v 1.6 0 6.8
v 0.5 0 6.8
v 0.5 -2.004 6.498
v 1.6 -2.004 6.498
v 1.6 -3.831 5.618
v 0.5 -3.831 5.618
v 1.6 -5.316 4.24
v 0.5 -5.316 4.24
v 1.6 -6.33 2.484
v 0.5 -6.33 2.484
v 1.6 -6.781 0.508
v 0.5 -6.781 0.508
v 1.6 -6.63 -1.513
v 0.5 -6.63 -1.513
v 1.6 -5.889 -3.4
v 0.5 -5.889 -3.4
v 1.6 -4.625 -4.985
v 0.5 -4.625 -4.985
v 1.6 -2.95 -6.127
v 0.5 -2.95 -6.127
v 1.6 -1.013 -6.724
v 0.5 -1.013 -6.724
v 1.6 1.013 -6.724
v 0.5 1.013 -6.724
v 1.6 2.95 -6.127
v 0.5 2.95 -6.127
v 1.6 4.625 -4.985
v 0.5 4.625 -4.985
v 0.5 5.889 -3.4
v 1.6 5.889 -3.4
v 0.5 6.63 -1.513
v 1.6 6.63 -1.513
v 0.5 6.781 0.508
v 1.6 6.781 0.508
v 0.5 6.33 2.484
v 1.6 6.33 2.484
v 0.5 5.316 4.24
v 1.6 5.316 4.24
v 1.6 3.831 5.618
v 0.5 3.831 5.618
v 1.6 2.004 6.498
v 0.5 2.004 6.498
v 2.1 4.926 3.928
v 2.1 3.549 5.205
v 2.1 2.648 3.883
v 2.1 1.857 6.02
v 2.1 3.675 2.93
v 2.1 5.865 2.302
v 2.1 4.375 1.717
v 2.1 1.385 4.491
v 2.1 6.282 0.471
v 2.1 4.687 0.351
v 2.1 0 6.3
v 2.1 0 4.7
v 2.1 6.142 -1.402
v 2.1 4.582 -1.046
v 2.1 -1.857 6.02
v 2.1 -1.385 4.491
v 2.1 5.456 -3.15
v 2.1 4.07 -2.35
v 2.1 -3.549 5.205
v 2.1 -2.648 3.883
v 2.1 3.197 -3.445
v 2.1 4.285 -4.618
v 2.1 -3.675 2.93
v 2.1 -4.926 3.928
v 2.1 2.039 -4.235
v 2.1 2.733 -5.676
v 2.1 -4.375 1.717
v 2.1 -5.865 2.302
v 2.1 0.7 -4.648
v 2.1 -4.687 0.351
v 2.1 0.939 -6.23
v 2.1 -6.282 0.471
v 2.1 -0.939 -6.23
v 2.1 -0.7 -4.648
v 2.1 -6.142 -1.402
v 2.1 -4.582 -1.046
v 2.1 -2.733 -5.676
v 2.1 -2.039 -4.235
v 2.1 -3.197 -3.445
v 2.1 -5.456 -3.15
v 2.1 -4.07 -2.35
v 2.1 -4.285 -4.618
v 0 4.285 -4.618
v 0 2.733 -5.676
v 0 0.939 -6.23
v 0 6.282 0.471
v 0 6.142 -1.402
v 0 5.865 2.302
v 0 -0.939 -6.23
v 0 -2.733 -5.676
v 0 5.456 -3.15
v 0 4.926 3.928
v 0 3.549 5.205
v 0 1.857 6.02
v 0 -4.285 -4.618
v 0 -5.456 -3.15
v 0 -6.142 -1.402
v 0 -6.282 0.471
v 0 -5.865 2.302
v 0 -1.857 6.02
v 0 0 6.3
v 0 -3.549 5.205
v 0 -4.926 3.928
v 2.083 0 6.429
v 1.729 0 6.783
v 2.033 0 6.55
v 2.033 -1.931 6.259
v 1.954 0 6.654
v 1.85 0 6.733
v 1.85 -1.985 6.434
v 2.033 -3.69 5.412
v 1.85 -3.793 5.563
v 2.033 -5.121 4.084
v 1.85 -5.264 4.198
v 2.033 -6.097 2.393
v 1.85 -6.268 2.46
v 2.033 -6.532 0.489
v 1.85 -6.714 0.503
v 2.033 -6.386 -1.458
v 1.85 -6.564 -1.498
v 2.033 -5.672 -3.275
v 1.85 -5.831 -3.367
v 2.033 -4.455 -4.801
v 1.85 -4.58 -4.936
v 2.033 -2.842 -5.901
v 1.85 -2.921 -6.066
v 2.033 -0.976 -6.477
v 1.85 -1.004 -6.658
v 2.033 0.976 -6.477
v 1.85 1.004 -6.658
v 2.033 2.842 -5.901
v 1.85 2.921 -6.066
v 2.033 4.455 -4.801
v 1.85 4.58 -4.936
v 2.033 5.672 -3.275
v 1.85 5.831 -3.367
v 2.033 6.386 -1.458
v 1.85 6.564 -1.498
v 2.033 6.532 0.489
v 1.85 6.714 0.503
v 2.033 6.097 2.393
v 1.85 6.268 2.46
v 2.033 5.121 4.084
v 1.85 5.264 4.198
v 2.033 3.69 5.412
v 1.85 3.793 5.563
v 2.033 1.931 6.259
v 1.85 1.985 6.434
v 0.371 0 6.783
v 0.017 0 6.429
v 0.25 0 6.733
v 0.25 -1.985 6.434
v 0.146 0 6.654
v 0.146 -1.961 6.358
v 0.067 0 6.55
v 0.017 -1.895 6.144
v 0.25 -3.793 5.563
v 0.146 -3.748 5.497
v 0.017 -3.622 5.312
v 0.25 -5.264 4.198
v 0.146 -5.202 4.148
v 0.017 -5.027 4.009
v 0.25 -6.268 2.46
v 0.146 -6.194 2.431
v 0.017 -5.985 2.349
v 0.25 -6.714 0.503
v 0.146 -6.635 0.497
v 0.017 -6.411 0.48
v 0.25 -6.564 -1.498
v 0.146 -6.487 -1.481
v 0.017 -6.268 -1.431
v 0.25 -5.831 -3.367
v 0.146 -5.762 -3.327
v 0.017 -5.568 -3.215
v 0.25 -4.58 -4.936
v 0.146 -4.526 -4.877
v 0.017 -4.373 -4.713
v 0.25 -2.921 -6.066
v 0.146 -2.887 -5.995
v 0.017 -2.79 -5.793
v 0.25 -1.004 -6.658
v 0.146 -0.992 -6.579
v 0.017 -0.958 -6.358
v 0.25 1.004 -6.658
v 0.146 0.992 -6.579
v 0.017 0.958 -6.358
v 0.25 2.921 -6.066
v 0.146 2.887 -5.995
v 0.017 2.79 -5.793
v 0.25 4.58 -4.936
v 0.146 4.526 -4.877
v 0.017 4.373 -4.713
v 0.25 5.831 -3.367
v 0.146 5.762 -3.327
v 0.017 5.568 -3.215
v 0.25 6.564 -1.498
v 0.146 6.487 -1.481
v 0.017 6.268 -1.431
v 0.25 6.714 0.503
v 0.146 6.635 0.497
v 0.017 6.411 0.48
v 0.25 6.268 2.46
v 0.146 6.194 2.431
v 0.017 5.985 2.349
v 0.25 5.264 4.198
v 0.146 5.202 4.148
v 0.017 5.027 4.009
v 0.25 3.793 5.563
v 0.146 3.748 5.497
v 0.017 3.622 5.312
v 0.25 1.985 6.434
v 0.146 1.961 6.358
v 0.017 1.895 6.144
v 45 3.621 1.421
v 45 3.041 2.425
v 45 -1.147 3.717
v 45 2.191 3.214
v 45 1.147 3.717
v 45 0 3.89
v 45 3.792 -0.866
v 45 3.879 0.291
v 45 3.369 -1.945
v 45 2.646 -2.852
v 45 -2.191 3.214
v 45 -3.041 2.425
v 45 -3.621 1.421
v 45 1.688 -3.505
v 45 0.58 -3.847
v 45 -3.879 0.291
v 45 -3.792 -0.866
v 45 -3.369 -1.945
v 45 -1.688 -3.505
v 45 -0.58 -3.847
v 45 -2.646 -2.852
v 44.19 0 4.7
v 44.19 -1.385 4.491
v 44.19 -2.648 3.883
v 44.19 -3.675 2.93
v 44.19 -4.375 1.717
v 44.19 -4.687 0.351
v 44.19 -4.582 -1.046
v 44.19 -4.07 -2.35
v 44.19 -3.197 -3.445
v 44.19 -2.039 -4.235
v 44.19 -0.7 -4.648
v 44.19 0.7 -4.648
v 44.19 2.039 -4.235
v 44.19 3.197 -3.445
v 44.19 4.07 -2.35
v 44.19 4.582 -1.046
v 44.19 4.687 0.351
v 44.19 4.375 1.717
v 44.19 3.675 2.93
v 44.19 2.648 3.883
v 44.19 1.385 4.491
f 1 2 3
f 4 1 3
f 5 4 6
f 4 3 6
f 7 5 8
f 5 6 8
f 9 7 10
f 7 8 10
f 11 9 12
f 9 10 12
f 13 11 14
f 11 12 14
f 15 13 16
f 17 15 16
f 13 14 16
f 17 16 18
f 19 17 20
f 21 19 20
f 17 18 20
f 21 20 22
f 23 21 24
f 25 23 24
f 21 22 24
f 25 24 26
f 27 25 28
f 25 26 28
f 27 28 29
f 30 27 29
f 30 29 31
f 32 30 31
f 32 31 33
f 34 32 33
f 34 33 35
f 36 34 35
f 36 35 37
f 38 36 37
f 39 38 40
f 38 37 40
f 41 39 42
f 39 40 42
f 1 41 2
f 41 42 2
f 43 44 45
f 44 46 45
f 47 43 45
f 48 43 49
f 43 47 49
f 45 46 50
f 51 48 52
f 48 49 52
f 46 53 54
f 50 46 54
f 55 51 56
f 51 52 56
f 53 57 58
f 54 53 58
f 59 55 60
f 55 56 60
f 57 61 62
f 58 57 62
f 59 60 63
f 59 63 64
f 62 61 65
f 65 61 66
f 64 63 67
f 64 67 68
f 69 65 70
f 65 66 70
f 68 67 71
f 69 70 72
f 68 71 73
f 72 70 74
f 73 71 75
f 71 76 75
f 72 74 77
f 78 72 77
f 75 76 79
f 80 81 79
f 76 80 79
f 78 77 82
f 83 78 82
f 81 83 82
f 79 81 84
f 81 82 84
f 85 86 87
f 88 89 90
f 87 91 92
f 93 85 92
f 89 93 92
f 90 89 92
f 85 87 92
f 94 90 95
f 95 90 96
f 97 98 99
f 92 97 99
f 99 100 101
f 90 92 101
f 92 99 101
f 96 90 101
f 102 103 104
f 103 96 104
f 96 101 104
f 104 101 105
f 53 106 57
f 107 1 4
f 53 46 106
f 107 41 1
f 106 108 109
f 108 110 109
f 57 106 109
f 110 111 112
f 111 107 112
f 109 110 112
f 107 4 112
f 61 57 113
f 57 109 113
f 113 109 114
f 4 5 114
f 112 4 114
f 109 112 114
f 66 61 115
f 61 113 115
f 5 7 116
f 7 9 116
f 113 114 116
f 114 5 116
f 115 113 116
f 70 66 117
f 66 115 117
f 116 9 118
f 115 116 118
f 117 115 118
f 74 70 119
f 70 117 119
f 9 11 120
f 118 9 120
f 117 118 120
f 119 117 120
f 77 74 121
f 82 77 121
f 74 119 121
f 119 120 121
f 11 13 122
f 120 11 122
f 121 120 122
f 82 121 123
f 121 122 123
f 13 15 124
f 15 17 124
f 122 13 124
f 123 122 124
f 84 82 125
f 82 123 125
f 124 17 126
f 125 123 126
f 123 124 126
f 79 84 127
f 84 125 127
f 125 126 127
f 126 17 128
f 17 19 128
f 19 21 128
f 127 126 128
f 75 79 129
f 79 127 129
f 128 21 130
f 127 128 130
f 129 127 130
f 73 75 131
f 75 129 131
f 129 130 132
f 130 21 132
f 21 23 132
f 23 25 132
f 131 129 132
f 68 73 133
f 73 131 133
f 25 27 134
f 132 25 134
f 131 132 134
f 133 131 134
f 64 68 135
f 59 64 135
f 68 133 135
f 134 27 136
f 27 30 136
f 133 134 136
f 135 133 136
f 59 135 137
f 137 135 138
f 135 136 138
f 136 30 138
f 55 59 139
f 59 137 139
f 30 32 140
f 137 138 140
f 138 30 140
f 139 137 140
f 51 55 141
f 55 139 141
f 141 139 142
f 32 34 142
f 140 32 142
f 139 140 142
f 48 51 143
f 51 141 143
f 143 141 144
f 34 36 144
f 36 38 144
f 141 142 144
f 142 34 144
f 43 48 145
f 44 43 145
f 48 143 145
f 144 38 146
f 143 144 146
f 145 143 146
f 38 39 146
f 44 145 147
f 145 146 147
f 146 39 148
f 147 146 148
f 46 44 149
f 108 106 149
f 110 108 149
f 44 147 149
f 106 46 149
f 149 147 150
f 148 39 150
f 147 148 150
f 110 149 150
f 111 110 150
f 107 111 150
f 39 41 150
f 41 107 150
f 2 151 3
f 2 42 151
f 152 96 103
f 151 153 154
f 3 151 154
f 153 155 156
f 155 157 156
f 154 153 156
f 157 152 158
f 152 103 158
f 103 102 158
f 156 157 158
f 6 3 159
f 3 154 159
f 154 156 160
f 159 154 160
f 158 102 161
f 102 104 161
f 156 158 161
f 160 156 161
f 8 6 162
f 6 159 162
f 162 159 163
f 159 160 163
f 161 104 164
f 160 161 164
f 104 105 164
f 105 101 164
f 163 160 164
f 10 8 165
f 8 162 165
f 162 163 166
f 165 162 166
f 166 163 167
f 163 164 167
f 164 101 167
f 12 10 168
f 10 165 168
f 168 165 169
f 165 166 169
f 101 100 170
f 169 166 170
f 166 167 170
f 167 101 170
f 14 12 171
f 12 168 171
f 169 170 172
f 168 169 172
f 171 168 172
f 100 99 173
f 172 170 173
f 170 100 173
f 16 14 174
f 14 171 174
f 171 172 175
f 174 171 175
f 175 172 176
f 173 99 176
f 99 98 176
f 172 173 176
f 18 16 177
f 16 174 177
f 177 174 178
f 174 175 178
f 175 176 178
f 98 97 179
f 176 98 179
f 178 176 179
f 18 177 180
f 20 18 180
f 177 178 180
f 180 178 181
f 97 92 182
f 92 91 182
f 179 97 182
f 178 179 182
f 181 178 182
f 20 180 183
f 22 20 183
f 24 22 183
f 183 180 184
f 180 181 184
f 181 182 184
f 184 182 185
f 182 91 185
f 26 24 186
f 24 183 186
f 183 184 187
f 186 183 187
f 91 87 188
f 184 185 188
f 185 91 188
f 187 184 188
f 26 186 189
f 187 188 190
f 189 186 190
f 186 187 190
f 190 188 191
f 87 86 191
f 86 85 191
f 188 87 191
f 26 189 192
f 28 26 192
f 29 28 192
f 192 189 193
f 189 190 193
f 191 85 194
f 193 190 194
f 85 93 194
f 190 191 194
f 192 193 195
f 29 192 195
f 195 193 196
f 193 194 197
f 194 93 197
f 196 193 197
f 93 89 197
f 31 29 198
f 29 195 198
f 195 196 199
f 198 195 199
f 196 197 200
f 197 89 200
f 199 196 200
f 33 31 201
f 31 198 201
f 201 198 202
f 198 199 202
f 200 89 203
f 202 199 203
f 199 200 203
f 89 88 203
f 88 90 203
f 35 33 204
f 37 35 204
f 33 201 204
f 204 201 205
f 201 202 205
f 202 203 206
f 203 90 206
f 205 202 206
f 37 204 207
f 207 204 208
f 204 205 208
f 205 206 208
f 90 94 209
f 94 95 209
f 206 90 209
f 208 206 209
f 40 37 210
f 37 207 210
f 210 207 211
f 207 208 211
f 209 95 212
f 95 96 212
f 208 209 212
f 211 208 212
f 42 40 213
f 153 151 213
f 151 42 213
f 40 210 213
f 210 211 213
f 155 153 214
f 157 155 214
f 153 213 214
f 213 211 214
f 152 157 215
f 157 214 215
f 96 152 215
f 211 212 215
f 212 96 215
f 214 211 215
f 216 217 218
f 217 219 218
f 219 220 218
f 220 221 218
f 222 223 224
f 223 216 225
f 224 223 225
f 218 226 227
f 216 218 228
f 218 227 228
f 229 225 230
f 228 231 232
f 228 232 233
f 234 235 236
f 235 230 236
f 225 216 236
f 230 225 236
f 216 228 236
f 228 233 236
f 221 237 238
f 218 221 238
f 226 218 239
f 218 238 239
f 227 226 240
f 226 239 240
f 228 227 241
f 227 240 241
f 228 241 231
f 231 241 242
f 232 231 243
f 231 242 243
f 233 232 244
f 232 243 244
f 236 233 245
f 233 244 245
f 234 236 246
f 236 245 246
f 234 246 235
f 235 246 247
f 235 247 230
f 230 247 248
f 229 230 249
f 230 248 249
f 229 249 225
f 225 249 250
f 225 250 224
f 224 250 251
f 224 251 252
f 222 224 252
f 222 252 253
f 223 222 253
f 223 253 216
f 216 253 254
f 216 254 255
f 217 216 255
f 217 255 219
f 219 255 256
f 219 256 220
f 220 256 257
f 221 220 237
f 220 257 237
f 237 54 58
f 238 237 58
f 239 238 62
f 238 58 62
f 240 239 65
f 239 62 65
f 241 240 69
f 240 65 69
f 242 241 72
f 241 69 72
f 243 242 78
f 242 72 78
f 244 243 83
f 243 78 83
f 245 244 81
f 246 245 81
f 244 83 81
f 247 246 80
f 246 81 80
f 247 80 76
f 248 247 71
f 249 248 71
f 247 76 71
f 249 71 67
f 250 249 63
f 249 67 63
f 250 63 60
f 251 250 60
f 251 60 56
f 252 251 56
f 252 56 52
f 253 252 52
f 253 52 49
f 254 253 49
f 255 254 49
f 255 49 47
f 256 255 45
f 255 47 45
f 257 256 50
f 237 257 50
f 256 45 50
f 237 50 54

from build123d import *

# Parameters (mm, degrees)
F2_SIZE2 = 0.81
F2_SIZE  = 0.81
F3_R     = 0.5


with BuildPart() as f1:
    # F0 (on Front) → F1 (revolve)
    with BuildSketch(Plane.XZ):
        Polygon((0, 6.8), (0, 0), (45, 0), (45, 4.7), (2.1, 4.7), (2.1, 6.8), align=None)
    revolve(axis=Axis((22.5, 0, 0), (1, 0, 0)))

    # F2
    f2_edges = [f1.edges().sort_by_distance(p)[0] for p in [
        (45, 0, -4.7),
    ]]
    chamfer(f2_edges, length=F2_SIZE, length2=F2_SIZE2)

    # F3
    f3_edges = [f1.edges().sort_by_distance(p)[0] for p in [
        (2.1, 0, -6.8),
        (0, 0, -6.8),
        (1.05, 0, 6.8),
    ]]
    fillet(f3_edges, radius=F3_R)


solid = f1.part
